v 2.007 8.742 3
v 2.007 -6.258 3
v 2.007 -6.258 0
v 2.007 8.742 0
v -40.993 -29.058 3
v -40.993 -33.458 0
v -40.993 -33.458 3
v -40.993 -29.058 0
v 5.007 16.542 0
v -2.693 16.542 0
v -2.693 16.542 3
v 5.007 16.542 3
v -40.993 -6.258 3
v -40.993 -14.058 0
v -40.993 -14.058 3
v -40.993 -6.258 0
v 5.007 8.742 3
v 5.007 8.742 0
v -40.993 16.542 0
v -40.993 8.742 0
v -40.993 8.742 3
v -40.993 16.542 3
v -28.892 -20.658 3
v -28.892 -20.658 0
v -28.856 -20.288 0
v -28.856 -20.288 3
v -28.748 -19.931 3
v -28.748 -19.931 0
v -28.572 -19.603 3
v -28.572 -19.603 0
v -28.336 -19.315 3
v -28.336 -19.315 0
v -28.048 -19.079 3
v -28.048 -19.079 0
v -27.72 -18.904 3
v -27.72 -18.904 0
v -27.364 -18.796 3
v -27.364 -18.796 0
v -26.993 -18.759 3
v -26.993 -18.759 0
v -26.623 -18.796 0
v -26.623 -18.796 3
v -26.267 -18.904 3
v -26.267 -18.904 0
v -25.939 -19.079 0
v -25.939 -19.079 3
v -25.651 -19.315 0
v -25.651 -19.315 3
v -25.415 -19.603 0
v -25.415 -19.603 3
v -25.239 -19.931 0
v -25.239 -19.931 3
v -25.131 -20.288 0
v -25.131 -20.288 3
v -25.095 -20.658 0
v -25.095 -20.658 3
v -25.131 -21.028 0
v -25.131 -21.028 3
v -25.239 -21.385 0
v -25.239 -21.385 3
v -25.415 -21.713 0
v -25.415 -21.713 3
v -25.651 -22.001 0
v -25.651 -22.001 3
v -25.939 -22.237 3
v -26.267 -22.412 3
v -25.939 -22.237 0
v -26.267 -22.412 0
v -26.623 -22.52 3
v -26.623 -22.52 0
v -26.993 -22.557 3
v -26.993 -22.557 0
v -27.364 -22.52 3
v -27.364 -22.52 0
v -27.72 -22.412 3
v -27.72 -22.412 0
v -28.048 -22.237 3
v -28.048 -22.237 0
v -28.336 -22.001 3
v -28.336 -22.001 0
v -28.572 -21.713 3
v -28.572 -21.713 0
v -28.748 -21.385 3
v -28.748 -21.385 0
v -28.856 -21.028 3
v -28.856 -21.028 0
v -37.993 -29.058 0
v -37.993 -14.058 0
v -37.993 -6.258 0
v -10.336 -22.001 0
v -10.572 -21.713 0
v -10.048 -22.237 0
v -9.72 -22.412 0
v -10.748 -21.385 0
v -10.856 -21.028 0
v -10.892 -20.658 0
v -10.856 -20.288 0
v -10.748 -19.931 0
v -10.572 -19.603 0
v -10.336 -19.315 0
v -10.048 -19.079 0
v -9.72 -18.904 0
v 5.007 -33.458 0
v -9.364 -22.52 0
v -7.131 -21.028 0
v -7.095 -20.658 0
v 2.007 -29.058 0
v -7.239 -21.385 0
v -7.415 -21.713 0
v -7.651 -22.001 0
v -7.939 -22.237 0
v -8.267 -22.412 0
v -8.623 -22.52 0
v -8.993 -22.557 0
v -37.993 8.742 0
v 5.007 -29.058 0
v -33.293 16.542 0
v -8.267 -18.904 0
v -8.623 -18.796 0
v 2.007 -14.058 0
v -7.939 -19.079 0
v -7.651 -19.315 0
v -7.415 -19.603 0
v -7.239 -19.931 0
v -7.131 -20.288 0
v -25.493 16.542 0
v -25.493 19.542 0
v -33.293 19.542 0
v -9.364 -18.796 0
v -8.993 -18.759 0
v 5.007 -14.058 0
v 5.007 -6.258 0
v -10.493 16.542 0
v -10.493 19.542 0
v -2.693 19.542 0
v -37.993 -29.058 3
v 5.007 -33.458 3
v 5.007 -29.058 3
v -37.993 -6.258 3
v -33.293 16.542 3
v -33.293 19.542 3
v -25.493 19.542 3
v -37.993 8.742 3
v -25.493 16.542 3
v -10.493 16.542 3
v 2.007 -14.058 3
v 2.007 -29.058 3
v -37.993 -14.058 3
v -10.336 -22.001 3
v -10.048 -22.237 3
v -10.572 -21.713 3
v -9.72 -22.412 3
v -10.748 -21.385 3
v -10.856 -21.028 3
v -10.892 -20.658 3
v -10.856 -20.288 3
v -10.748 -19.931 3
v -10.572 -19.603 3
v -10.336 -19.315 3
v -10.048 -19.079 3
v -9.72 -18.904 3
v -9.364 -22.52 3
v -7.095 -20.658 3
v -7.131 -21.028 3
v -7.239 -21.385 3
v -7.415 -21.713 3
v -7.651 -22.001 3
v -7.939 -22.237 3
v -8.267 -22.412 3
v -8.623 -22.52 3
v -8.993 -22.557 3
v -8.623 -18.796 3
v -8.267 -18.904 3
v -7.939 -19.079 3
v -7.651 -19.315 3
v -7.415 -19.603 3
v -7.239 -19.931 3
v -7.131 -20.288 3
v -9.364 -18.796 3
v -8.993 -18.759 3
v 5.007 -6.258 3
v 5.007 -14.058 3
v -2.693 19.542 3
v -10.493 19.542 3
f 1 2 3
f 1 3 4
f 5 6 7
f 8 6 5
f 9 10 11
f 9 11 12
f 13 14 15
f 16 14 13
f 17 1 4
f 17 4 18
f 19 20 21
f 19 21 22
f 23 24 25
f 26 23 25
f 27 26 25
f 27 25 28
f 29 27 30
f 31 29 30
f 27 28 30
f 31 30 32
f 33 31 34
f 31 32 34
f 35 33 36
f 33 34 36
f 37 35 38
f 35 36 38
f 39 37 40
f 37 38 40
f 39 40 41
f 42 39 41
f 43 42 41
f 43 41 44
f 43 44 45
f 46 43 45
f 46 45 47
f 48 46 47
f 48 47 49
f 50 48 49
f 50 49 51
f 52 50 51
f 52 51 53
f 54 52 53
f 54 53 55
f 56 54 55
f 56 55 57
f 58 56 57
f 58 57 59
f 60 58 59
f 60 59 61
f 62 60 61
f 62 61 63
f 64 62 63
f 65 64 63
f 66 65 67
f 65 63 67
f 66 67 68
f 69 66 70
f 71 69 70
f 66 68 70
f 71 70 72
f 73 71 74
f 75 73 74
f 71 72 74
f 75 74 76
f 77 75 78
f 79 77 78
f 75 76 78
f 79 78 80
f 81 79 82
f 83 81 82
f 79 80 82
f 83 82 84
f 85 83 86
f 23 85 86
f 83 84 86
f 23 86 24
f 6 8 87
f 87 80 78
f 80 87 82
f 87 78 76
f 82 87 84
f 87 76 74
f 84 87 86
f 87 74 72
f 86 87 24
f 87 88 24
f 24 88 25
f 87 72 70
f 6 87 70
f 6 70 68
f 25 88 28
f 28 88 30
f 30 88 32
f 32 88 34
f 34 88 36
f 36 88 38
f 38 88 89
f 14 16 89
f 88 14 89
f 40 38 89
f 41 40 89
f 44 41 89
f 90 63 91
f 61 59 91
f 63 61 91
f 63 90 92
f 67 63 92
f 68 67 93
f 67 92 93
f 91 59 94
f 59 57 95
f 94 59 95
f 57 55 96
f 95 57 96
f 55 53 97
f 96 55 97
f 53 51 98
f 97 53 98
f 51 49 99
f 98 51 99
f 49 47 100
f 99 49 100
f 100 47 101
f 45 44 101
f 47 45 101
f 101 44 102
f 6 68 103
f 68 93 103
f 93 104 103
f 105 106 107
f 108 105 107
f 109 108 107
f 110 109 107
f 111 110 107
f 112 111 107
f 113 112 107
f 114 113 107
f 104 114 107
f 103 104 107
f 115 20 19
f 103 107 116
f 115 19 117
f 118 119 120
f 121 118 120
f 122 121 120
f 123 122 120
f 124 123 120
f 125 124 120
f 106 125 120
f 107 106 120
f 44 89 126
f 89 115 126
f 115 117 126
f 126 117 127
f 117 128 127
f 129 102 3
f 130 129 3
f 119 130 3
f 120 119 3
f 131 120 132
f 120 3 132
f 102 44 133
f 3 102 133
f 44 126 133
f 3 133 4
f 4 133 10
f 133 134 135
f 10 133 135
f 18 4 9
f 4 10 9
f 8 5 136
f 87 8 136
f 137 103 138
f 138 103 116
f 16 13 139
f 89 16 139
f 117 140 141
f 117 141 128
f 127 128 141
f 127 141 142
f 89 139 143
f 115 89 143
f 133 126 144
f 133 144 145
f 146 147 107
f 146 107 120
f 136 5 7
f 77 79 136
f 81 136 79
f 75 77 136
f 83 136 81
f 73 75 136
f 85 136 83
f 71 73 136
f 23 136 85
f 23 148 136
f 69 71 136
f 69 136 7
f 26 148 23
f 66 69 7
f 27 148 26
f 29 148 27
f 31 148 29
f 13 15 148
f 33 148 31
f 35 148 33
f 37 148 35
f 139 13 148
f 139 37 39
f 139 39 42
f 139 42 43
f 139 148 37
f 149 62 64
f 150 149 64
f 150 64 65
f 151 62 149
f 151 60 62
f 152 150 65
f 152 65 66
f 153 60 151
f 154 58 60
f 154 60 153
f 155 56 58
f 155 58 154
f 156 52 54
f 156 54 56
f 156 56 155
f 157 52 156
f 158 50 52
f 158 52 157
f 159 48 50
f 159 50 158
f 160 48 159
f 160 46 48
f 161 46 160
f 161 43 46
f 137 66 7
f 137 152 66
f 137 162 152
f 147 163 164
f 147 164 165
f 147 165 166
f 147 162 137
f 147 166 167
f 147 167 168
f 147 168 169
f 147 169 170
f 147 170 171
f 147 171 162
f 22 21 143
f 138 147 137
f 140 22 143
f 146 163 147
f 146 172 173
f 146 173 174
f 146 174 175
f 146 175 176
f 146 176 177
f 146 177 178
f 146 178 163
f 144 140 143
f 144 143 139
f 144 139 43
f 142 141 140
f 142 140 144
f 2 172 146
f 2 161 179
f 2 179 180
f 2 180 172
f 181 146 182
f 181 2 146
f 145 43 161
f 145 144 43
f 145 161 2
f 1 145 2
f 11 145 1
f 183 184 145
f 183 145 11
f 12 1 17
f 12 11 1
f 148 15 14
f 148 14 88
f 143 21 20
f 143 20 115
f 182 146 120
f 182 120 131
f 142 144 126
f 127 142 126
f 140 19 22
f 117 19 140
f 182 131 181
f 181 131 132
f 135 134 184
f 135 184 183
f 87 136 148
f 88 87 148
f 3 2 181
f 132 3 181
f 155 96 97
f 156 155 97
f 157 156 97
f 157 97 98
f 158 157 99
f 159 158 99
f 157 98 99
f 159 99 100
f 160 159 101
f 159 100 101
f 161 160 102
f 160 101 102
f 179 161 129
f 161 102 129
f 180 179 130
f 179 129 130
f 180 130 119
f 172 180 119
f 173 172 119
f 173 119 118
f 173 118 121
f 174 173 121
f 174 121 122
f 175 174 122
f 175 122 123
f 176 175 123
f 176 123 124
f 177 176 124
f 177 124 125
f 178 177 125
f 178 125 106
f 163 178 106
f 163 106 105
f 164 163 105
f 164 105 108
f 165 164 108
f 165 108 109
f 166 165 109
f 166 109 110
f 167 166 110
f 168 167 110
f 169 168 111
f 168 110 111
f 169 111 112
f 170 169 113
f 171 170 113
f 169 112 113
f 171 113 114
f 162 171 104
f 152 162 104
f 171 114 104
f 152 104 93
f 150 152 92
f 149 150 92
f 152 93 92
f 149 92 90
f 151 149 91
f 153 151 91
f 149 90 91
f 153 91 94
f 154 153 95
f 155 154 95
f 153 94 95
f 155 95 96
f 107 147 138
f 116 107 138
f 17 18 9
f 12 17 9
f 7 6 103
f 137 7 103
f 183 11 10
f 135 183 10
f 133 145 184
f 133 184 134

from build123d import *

# Parameters (mm, degrees)
SKETCH1_W             = 46
SKETCH1_H             = 50
BOSS_EXTRUDE1_DEPTH   = 3
SKETCH2_W             = 3
SKETCH2_H             = 15
CUT_EXTRUDE1_DEPTH    = 53.999062732
LPATTERN1_COUNT       = 3
LPATTERN1_PITCH       = 22.8
SKETCH3_W             = 7.8
SKETCH3_H             = 3
BOSS_EXTRUDE2_DEPTH   = 3
LPATTERN2_COUNT       = 2
LPATTERN2_PITCH       = 22.8
F_6_CLEARANCE_HOLE1_D = 3.7973


with BuildPart() as part:
    # Sketch1 → Boss-Extrude1 (new body)
    with BuildSketch(Plane.XY):
        with Locations((-17.993460648, -8.457986111)):
            Rectangle(SKETCH1_W, SKETCH1_H)
    extrude(amount=BOSS_EXTRUDE1_DEPTH)

    # Sketch2 → Cut-Extrude1 (cut, through all)
    with BuildSketch(Plane.XY.offset(3)):
        with Locations((-39.493460648, 1.242013889)):
            Rectangle(SKETCH2_W, SKETCH2_H)
        with Locations((3.506539352, 1.242013889)):
            Rectangle(SKETCH2_W, SKETCH2_H)
    cut_extrude1 = extrude(amount=-CUT_EXTRUDE1_DEPTH, mode=Mode.SUBTRACT)

    # LPattern1: Cut-Extrude1 ×3
    with Locations(*[(0, -i * LPATTERN1_PITCH, 0) for i in range(1, LPATTERN1_COUNT)]):
        add(cut_extrude1, mode=Mode.SUBTRACT)

    # Sketch3 → Boss-Extrude2 (add)
    with BuildSketch(Plane(origin=(0, 16.542013889, 0), x_dir=(1, 0, 0), z_dir=(0, 1, 0))):
        with Locations((-29.393460648, -1.5)):
            Rectangle(SKETCH3_W, SKETCH3_H)
    boss_extrude2 = extrude(amount=BOSS_EXTRUDE2_DEPTH)

    # LPattern2: Boss-Extrude2 ×2
    with Locations(*[(i * LPATTERN2_PITCH, 0, 0) for i in range(1, LPATTERN2_COUNT)]):
        add(boss_extrude2)

    # #6 Clearance Hole1 (through all)
    with Locations(Plane.XY.offset(3)):
        with Locations((-8.993460648, -20.657986111), (-26.993460648, -20.657986111)):
            Hole(F_6_CLEARANCE_HOLE1_D / 2)


solid = part.part
